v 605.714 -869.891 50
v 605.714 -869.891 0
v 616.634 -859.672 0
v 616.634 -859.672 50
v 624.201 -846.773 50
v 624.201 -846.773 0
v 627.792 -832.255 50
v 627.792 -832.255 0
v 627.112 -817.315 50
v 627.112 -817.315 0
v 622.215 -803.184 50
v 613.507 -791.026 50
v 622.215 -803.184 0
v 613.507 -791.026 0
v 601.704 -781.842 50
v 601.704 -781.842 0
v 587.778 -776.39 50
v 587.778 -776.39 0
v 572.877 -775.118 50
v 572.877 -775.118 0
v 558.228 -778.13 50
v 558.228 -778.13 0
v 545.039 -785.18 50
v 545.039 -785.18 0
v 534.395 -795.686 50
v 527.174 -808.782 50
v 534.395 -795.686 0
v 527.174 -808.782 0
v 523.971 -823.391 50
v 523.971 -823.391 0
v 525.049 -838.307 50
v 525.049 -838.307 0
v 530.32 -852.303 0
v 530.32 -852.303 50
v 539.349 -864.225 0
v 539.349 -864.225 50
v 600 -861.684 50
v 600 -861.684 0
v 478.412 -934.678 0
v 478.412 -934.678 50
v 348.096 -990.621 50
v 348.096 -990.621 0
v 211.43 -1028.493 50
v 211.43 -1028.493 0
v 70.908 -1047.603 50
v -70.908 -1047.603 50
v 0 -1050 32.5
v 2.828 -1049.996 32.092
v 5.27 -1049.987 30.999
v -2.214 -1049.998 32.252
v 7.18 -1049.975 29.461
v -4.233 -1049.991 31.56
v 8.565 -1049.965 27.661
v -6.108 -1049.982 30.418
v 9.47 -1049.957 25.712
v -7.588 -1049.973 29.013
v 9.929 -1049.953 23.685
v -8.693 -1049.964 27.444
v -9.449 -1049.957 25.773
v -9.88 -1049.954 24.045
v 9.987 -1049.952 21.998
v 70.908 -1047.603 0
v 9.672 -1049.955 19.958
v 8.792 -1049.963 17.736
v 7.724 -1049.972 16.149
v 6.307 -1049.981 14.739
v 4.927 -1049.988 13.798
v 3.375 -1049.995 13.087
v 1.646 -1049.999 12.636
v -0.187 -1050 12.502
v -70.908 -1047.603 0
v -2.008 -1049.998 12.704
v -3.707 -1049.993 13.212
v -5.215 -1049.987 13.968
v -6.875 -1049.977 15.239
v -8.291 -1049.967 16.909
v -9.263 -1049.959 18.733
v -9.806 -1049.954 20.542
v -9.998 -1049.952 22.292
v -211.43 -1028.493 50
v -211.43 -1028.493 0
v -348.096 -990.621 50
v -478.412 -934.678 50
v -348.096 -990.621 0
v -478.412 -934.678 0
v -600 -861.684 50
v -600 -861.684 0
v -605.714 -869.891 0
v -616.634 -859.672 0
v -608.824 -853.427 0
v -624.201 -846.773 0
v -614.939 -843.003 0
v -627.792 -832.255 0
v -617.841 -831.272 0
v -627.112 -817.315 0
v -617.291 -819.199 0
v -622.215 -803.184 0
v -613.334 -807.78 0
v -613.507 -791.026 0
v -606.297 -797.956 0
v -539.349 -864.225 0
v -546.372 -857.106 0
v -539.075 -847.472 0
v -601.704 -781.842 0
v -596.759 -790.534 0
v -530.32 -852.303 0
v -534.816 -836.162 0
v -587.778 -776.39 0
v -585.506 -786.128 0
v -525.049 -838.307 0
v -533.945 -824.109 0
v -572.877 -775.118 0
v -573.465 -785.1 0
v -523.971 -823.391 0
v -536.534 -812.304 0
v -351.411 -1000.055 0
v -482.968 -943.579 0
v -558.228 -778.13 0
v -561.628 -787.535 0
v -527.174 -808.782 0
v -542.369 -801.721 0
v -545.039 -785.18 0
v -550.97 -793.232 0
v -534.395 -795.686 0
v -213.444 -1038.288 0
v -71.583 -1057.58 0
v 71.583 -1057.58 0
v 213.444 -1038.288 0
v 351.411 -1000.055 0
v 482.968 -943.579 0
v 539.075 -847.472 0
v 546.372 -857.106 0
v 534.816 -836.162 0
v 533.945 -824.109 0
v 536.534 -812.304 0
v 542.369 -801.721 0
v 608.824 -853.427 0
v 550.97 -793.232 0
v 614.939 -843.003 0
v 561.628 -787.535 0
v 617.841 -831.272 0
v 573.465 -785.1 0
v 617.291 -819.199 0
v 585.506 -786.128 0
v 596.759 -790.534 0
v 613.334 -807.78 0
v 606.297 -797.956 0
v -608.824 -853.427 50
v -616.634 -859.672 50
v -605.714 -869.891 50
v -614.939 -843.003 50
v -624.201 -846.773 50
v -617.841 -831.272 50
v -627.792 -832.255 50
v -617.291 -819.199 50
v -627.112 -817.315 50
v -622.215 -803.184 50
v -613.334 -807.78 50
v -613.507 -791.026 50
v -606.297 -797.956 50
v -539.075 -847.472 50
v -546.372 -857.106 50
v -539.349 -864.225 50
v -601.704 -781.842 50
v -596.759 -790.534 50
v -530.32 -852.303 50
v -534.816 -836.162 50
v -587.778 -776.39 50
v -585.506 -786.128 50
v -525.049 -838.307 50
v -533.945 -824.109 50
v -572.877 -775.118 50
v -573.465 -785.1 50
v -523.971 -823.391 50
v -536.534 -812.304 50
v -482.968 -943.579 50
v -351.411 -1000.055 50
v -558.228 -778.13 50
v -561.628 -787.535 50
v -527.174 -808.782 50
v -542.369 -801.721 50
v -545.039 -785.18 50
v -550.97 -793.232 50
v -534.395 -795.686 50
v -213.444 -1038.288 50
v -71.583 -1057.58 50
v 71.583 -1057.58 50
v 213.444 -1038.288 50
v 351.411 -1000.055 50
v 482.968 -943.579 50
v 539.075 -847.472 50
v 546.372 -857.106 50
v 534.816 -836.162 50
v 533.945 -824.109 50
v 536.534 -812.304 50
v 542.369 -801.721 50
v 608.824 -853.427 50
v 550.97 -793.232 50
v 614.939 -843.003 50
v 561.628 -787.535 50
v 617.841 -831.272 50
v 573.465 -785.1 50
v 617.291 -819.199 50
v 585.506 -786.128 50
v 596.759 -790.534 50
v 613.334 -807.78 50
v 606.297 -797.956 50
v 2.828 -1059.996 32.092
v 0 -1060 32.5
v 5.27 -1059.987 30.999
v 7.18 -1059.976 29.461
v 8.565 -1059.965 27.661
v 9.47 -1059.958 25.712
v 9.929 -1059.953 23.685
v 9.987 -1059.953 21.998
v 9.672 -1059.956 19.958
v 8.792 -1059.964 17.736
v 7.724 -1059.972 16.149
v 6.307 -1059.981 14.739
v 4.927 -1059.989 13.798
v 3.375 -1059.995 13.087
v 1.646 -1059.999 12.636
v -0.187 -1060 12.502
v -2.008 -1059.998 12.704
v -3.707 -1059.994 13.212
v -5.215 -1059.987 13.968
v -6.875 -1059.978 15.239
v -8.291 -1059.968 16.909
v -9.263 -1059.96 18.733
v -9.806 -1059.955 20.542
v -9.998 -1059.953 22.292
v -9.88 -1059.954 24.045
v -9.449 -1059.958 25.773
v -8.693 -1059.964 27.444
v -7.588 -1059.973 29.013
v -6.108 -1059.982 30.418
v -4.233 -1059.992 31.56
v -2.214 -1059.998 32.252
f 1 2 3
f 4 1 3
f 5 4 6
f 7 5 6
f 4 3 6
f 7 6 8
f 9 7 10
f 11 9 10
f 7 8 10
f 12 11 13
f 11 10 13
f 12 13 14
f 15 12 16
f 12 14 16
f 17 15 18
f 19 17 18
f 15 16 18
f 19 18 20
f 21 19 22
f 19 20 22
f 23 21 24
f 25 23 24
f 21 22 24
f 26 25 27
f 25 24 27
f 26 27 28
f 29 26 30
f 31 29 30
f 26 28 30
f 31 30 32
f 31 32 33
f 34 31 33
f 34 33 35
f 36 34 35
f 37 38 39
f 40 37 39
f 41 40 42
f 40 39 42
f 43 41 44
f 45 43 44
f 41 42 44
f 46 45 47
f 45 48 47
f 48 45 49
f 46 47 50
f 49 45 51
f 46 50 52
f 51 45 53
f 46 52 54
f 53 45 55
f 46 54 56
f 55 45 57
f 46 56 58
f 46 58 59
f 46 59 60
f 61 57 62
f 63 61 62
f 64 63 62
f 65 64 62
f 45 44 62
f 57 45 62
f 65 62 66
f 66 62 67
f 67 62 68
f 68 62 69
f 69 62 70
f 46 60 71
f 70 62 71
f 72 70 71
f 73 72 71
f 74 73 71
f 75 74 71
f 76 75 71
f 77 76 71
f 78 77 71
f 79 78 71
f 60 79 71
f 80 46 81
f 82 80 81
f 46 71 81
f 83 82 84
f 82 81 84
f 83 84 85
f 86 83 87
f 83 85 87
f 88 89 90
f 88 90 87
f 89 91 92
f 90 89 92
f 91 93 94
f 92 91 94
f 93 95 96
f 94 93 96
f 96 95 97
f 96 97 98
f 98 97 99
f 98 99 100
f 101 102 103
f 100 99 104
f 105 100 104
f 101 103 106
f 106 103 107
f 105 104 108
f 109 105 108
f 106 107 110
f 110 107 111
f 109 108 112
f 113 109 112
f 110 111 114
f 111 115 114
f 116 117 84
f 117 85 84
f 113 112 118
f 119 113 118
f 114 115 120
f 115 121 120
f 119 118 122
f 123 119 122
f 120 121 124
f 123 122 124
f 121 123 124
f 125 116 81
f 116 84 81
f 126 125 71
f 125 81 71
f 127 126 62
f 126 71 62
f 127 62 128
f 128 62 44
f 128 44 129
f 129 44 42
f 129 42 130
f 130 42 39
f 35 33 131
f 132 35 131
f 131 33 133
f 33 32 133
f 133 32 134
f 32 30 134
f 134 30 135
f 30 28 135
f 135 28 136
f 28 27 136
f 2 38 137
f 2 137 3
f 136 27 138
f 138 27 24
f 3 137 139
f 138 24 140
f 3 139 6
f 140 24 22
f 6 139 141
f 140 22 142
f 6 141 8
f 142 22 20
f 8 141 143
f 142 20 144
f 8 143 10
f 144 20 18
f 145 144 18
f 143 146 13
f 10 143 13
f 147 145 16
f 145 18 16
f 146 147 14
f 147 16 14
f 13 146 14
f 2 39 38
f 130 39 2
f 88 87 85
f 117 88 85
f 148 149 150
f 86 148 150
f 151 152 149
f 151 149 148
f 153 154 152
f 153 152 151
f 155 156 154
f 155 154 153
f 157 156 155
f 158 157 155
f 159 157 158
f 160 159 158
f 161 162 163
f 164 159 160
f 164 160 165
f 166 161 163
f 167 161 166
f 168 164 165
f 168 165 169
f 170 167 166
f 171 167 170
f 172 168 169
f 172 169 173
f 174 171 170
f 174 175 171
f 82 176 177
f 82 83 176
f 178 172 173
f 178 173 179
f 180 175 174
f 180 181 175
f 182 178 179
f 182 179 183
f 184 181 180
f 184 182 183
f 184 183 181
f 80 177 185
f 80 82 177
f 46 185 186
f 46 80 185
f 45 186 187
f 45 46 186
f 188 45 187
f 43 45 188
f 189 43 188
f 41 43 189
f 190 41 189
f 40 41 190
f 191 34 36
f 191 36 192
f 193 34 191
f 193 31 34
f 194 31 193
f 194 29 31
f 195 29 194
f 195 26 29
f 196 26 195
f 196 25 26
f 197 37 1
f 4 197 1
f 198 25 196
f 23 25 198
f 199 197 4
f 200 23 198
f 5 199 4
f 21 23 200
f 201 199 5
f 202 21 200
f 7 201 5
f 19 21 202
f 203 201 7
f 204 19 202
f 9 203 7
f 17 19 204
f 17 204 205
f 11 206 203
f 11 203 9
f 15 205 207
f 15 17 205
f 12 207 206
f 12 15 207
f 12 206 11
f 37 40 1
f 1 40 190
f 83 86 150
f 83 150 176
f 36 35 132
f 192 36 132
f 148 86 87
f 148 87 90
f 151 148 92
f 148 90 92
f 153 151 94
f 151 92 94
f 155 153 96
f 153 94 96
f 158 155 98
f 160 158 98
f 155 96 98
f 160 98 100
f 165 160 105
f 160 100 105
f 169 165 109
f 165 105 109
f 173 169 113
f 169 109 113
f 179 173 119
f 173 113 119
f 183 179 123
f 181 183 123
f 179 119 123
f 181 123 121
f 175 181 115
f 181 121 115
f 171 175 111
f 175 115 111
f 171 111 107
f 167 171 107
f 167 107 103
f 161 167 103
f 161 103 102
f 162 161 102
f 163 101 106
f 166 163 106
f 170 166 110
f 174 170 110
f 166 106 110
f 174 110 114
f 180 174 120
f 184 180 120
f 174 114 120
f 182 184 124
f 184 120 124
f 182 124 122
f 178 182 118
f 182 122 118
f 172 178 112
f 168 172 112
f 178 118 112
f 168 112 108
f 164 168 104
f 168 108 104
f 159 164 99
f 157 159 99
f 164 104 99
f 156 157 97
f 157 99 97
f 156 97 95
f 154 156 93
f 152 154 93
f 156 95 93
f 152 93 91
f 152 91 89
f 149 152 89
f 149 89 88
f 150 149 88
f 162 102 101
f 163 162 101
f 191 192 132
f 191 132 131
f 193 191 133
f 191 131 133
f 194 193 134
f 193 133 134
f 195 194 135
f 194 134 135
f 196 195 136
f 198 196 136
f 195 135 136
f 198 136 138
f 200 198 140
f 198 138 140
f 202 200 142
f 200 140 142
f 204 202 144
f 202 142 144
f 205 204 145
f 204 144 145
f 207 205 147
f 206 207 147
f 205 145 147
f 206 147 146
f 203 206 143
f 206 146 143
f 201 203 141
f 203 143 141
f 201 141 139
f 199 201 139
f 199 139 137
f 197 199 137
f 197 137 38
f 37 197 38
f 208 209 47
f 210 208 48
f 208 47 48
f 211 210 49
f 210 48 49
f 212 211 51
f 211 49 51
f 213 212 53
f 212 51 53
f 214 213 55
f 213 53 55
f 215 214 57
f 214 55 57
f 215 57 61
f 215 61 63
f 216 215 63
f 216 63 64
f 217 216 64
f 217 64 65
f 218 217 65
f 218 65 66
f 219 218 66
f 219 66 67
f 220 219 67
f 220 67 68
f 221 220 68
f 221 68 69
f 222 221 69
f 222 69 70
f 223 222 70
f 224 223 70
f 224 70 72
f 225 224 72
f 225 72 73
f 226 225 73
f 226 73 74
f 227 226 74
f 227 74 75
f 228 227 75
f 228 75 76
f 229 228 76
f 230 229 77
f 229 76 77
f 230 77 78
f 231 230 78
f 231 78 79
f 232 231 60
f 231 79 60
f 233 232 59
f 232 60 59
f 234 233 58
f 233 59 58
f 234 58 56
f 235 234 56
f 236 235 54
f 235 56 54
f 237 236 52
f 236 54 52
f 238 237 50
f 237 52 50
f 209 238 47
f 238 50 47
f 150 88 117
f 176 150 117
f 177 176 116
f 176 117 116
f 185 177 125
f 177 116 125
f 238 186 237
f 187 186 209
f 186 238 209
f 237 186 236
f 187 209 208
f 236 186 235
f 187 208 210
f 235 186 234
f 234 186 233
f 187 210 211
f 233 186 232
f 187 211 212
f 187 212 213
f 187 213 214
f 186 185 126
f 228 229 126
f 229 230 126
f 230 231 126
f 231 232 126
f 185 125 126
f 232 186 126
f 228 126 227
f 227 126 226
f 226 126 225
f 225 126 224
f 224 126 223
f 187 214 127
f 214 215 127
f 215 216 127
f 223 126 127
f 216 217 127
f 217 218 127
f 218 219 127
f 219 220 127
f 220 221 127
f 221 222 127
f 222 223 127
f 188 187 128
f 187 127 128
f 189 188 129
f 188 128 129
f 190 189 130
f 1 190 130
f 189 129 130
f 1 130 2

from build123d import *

# Parameters (mm, degrees)
BOSS_EXTRUDE1_DEPTH = 50
SKETCH3_R           = 10
CUT_EXTRUDE1_DEPTH  = 1234.101799213


with BuildPart() as part:
    # Sketch1 → Boss-Extrude1 (new body)
    with BuildSketch(Plane.XY):
        with BuildLine():
            Line((-546.37161216, -857.105521629), (-539.348809346, -864.224527221))
            ThreePointArc((-539.348809346, -864.224527221), (-580.373107294, -775.216346142), (-605.714285714, -869.890915047))
            ThreePointArc((-605.714285714, -869.890915047), (0, -1060), (605.714285714, -869.890915047))
            ThreePointArc((605.714285714, -869.890915047), (580.373107294, -775.216346142), (539.348809346, -864.224527221))
            Line((539.348809346, -864.224527221), (546.37161216, -857.105521629))
            ThreePointArc((546.37161216, -857.105521629), (579.522386954, -785.180094177), (600, -861.684396981))
            ThreePointArc((600, -861.684396981), (0, -1050), (-600, -861.684396981))
            ThreePointArc((-600, -861.684396981), (-579.522386954, -785.180094177), (-546.37161216, -857.105521629))
        make_face()
    extrude(amount=BOSS_EXTRUDE1_DEPTH)

    # Sketch3 → Cut-Extrude1 (cut, through all)
    with BuildSketch(Plane(origin=(0, 0, 0), x_dir=(1, 0, 0), z_dir=(0, 1, 0))):
        with Locations(Location((0, -22.5, 0), (0, 0, 270))):
            Circle(SKETCH3_R)
    extrude(amount=-CUT_EXTRUDE1_DEPTH, mode=Mode.SUBTRACT)


solid = part.part
